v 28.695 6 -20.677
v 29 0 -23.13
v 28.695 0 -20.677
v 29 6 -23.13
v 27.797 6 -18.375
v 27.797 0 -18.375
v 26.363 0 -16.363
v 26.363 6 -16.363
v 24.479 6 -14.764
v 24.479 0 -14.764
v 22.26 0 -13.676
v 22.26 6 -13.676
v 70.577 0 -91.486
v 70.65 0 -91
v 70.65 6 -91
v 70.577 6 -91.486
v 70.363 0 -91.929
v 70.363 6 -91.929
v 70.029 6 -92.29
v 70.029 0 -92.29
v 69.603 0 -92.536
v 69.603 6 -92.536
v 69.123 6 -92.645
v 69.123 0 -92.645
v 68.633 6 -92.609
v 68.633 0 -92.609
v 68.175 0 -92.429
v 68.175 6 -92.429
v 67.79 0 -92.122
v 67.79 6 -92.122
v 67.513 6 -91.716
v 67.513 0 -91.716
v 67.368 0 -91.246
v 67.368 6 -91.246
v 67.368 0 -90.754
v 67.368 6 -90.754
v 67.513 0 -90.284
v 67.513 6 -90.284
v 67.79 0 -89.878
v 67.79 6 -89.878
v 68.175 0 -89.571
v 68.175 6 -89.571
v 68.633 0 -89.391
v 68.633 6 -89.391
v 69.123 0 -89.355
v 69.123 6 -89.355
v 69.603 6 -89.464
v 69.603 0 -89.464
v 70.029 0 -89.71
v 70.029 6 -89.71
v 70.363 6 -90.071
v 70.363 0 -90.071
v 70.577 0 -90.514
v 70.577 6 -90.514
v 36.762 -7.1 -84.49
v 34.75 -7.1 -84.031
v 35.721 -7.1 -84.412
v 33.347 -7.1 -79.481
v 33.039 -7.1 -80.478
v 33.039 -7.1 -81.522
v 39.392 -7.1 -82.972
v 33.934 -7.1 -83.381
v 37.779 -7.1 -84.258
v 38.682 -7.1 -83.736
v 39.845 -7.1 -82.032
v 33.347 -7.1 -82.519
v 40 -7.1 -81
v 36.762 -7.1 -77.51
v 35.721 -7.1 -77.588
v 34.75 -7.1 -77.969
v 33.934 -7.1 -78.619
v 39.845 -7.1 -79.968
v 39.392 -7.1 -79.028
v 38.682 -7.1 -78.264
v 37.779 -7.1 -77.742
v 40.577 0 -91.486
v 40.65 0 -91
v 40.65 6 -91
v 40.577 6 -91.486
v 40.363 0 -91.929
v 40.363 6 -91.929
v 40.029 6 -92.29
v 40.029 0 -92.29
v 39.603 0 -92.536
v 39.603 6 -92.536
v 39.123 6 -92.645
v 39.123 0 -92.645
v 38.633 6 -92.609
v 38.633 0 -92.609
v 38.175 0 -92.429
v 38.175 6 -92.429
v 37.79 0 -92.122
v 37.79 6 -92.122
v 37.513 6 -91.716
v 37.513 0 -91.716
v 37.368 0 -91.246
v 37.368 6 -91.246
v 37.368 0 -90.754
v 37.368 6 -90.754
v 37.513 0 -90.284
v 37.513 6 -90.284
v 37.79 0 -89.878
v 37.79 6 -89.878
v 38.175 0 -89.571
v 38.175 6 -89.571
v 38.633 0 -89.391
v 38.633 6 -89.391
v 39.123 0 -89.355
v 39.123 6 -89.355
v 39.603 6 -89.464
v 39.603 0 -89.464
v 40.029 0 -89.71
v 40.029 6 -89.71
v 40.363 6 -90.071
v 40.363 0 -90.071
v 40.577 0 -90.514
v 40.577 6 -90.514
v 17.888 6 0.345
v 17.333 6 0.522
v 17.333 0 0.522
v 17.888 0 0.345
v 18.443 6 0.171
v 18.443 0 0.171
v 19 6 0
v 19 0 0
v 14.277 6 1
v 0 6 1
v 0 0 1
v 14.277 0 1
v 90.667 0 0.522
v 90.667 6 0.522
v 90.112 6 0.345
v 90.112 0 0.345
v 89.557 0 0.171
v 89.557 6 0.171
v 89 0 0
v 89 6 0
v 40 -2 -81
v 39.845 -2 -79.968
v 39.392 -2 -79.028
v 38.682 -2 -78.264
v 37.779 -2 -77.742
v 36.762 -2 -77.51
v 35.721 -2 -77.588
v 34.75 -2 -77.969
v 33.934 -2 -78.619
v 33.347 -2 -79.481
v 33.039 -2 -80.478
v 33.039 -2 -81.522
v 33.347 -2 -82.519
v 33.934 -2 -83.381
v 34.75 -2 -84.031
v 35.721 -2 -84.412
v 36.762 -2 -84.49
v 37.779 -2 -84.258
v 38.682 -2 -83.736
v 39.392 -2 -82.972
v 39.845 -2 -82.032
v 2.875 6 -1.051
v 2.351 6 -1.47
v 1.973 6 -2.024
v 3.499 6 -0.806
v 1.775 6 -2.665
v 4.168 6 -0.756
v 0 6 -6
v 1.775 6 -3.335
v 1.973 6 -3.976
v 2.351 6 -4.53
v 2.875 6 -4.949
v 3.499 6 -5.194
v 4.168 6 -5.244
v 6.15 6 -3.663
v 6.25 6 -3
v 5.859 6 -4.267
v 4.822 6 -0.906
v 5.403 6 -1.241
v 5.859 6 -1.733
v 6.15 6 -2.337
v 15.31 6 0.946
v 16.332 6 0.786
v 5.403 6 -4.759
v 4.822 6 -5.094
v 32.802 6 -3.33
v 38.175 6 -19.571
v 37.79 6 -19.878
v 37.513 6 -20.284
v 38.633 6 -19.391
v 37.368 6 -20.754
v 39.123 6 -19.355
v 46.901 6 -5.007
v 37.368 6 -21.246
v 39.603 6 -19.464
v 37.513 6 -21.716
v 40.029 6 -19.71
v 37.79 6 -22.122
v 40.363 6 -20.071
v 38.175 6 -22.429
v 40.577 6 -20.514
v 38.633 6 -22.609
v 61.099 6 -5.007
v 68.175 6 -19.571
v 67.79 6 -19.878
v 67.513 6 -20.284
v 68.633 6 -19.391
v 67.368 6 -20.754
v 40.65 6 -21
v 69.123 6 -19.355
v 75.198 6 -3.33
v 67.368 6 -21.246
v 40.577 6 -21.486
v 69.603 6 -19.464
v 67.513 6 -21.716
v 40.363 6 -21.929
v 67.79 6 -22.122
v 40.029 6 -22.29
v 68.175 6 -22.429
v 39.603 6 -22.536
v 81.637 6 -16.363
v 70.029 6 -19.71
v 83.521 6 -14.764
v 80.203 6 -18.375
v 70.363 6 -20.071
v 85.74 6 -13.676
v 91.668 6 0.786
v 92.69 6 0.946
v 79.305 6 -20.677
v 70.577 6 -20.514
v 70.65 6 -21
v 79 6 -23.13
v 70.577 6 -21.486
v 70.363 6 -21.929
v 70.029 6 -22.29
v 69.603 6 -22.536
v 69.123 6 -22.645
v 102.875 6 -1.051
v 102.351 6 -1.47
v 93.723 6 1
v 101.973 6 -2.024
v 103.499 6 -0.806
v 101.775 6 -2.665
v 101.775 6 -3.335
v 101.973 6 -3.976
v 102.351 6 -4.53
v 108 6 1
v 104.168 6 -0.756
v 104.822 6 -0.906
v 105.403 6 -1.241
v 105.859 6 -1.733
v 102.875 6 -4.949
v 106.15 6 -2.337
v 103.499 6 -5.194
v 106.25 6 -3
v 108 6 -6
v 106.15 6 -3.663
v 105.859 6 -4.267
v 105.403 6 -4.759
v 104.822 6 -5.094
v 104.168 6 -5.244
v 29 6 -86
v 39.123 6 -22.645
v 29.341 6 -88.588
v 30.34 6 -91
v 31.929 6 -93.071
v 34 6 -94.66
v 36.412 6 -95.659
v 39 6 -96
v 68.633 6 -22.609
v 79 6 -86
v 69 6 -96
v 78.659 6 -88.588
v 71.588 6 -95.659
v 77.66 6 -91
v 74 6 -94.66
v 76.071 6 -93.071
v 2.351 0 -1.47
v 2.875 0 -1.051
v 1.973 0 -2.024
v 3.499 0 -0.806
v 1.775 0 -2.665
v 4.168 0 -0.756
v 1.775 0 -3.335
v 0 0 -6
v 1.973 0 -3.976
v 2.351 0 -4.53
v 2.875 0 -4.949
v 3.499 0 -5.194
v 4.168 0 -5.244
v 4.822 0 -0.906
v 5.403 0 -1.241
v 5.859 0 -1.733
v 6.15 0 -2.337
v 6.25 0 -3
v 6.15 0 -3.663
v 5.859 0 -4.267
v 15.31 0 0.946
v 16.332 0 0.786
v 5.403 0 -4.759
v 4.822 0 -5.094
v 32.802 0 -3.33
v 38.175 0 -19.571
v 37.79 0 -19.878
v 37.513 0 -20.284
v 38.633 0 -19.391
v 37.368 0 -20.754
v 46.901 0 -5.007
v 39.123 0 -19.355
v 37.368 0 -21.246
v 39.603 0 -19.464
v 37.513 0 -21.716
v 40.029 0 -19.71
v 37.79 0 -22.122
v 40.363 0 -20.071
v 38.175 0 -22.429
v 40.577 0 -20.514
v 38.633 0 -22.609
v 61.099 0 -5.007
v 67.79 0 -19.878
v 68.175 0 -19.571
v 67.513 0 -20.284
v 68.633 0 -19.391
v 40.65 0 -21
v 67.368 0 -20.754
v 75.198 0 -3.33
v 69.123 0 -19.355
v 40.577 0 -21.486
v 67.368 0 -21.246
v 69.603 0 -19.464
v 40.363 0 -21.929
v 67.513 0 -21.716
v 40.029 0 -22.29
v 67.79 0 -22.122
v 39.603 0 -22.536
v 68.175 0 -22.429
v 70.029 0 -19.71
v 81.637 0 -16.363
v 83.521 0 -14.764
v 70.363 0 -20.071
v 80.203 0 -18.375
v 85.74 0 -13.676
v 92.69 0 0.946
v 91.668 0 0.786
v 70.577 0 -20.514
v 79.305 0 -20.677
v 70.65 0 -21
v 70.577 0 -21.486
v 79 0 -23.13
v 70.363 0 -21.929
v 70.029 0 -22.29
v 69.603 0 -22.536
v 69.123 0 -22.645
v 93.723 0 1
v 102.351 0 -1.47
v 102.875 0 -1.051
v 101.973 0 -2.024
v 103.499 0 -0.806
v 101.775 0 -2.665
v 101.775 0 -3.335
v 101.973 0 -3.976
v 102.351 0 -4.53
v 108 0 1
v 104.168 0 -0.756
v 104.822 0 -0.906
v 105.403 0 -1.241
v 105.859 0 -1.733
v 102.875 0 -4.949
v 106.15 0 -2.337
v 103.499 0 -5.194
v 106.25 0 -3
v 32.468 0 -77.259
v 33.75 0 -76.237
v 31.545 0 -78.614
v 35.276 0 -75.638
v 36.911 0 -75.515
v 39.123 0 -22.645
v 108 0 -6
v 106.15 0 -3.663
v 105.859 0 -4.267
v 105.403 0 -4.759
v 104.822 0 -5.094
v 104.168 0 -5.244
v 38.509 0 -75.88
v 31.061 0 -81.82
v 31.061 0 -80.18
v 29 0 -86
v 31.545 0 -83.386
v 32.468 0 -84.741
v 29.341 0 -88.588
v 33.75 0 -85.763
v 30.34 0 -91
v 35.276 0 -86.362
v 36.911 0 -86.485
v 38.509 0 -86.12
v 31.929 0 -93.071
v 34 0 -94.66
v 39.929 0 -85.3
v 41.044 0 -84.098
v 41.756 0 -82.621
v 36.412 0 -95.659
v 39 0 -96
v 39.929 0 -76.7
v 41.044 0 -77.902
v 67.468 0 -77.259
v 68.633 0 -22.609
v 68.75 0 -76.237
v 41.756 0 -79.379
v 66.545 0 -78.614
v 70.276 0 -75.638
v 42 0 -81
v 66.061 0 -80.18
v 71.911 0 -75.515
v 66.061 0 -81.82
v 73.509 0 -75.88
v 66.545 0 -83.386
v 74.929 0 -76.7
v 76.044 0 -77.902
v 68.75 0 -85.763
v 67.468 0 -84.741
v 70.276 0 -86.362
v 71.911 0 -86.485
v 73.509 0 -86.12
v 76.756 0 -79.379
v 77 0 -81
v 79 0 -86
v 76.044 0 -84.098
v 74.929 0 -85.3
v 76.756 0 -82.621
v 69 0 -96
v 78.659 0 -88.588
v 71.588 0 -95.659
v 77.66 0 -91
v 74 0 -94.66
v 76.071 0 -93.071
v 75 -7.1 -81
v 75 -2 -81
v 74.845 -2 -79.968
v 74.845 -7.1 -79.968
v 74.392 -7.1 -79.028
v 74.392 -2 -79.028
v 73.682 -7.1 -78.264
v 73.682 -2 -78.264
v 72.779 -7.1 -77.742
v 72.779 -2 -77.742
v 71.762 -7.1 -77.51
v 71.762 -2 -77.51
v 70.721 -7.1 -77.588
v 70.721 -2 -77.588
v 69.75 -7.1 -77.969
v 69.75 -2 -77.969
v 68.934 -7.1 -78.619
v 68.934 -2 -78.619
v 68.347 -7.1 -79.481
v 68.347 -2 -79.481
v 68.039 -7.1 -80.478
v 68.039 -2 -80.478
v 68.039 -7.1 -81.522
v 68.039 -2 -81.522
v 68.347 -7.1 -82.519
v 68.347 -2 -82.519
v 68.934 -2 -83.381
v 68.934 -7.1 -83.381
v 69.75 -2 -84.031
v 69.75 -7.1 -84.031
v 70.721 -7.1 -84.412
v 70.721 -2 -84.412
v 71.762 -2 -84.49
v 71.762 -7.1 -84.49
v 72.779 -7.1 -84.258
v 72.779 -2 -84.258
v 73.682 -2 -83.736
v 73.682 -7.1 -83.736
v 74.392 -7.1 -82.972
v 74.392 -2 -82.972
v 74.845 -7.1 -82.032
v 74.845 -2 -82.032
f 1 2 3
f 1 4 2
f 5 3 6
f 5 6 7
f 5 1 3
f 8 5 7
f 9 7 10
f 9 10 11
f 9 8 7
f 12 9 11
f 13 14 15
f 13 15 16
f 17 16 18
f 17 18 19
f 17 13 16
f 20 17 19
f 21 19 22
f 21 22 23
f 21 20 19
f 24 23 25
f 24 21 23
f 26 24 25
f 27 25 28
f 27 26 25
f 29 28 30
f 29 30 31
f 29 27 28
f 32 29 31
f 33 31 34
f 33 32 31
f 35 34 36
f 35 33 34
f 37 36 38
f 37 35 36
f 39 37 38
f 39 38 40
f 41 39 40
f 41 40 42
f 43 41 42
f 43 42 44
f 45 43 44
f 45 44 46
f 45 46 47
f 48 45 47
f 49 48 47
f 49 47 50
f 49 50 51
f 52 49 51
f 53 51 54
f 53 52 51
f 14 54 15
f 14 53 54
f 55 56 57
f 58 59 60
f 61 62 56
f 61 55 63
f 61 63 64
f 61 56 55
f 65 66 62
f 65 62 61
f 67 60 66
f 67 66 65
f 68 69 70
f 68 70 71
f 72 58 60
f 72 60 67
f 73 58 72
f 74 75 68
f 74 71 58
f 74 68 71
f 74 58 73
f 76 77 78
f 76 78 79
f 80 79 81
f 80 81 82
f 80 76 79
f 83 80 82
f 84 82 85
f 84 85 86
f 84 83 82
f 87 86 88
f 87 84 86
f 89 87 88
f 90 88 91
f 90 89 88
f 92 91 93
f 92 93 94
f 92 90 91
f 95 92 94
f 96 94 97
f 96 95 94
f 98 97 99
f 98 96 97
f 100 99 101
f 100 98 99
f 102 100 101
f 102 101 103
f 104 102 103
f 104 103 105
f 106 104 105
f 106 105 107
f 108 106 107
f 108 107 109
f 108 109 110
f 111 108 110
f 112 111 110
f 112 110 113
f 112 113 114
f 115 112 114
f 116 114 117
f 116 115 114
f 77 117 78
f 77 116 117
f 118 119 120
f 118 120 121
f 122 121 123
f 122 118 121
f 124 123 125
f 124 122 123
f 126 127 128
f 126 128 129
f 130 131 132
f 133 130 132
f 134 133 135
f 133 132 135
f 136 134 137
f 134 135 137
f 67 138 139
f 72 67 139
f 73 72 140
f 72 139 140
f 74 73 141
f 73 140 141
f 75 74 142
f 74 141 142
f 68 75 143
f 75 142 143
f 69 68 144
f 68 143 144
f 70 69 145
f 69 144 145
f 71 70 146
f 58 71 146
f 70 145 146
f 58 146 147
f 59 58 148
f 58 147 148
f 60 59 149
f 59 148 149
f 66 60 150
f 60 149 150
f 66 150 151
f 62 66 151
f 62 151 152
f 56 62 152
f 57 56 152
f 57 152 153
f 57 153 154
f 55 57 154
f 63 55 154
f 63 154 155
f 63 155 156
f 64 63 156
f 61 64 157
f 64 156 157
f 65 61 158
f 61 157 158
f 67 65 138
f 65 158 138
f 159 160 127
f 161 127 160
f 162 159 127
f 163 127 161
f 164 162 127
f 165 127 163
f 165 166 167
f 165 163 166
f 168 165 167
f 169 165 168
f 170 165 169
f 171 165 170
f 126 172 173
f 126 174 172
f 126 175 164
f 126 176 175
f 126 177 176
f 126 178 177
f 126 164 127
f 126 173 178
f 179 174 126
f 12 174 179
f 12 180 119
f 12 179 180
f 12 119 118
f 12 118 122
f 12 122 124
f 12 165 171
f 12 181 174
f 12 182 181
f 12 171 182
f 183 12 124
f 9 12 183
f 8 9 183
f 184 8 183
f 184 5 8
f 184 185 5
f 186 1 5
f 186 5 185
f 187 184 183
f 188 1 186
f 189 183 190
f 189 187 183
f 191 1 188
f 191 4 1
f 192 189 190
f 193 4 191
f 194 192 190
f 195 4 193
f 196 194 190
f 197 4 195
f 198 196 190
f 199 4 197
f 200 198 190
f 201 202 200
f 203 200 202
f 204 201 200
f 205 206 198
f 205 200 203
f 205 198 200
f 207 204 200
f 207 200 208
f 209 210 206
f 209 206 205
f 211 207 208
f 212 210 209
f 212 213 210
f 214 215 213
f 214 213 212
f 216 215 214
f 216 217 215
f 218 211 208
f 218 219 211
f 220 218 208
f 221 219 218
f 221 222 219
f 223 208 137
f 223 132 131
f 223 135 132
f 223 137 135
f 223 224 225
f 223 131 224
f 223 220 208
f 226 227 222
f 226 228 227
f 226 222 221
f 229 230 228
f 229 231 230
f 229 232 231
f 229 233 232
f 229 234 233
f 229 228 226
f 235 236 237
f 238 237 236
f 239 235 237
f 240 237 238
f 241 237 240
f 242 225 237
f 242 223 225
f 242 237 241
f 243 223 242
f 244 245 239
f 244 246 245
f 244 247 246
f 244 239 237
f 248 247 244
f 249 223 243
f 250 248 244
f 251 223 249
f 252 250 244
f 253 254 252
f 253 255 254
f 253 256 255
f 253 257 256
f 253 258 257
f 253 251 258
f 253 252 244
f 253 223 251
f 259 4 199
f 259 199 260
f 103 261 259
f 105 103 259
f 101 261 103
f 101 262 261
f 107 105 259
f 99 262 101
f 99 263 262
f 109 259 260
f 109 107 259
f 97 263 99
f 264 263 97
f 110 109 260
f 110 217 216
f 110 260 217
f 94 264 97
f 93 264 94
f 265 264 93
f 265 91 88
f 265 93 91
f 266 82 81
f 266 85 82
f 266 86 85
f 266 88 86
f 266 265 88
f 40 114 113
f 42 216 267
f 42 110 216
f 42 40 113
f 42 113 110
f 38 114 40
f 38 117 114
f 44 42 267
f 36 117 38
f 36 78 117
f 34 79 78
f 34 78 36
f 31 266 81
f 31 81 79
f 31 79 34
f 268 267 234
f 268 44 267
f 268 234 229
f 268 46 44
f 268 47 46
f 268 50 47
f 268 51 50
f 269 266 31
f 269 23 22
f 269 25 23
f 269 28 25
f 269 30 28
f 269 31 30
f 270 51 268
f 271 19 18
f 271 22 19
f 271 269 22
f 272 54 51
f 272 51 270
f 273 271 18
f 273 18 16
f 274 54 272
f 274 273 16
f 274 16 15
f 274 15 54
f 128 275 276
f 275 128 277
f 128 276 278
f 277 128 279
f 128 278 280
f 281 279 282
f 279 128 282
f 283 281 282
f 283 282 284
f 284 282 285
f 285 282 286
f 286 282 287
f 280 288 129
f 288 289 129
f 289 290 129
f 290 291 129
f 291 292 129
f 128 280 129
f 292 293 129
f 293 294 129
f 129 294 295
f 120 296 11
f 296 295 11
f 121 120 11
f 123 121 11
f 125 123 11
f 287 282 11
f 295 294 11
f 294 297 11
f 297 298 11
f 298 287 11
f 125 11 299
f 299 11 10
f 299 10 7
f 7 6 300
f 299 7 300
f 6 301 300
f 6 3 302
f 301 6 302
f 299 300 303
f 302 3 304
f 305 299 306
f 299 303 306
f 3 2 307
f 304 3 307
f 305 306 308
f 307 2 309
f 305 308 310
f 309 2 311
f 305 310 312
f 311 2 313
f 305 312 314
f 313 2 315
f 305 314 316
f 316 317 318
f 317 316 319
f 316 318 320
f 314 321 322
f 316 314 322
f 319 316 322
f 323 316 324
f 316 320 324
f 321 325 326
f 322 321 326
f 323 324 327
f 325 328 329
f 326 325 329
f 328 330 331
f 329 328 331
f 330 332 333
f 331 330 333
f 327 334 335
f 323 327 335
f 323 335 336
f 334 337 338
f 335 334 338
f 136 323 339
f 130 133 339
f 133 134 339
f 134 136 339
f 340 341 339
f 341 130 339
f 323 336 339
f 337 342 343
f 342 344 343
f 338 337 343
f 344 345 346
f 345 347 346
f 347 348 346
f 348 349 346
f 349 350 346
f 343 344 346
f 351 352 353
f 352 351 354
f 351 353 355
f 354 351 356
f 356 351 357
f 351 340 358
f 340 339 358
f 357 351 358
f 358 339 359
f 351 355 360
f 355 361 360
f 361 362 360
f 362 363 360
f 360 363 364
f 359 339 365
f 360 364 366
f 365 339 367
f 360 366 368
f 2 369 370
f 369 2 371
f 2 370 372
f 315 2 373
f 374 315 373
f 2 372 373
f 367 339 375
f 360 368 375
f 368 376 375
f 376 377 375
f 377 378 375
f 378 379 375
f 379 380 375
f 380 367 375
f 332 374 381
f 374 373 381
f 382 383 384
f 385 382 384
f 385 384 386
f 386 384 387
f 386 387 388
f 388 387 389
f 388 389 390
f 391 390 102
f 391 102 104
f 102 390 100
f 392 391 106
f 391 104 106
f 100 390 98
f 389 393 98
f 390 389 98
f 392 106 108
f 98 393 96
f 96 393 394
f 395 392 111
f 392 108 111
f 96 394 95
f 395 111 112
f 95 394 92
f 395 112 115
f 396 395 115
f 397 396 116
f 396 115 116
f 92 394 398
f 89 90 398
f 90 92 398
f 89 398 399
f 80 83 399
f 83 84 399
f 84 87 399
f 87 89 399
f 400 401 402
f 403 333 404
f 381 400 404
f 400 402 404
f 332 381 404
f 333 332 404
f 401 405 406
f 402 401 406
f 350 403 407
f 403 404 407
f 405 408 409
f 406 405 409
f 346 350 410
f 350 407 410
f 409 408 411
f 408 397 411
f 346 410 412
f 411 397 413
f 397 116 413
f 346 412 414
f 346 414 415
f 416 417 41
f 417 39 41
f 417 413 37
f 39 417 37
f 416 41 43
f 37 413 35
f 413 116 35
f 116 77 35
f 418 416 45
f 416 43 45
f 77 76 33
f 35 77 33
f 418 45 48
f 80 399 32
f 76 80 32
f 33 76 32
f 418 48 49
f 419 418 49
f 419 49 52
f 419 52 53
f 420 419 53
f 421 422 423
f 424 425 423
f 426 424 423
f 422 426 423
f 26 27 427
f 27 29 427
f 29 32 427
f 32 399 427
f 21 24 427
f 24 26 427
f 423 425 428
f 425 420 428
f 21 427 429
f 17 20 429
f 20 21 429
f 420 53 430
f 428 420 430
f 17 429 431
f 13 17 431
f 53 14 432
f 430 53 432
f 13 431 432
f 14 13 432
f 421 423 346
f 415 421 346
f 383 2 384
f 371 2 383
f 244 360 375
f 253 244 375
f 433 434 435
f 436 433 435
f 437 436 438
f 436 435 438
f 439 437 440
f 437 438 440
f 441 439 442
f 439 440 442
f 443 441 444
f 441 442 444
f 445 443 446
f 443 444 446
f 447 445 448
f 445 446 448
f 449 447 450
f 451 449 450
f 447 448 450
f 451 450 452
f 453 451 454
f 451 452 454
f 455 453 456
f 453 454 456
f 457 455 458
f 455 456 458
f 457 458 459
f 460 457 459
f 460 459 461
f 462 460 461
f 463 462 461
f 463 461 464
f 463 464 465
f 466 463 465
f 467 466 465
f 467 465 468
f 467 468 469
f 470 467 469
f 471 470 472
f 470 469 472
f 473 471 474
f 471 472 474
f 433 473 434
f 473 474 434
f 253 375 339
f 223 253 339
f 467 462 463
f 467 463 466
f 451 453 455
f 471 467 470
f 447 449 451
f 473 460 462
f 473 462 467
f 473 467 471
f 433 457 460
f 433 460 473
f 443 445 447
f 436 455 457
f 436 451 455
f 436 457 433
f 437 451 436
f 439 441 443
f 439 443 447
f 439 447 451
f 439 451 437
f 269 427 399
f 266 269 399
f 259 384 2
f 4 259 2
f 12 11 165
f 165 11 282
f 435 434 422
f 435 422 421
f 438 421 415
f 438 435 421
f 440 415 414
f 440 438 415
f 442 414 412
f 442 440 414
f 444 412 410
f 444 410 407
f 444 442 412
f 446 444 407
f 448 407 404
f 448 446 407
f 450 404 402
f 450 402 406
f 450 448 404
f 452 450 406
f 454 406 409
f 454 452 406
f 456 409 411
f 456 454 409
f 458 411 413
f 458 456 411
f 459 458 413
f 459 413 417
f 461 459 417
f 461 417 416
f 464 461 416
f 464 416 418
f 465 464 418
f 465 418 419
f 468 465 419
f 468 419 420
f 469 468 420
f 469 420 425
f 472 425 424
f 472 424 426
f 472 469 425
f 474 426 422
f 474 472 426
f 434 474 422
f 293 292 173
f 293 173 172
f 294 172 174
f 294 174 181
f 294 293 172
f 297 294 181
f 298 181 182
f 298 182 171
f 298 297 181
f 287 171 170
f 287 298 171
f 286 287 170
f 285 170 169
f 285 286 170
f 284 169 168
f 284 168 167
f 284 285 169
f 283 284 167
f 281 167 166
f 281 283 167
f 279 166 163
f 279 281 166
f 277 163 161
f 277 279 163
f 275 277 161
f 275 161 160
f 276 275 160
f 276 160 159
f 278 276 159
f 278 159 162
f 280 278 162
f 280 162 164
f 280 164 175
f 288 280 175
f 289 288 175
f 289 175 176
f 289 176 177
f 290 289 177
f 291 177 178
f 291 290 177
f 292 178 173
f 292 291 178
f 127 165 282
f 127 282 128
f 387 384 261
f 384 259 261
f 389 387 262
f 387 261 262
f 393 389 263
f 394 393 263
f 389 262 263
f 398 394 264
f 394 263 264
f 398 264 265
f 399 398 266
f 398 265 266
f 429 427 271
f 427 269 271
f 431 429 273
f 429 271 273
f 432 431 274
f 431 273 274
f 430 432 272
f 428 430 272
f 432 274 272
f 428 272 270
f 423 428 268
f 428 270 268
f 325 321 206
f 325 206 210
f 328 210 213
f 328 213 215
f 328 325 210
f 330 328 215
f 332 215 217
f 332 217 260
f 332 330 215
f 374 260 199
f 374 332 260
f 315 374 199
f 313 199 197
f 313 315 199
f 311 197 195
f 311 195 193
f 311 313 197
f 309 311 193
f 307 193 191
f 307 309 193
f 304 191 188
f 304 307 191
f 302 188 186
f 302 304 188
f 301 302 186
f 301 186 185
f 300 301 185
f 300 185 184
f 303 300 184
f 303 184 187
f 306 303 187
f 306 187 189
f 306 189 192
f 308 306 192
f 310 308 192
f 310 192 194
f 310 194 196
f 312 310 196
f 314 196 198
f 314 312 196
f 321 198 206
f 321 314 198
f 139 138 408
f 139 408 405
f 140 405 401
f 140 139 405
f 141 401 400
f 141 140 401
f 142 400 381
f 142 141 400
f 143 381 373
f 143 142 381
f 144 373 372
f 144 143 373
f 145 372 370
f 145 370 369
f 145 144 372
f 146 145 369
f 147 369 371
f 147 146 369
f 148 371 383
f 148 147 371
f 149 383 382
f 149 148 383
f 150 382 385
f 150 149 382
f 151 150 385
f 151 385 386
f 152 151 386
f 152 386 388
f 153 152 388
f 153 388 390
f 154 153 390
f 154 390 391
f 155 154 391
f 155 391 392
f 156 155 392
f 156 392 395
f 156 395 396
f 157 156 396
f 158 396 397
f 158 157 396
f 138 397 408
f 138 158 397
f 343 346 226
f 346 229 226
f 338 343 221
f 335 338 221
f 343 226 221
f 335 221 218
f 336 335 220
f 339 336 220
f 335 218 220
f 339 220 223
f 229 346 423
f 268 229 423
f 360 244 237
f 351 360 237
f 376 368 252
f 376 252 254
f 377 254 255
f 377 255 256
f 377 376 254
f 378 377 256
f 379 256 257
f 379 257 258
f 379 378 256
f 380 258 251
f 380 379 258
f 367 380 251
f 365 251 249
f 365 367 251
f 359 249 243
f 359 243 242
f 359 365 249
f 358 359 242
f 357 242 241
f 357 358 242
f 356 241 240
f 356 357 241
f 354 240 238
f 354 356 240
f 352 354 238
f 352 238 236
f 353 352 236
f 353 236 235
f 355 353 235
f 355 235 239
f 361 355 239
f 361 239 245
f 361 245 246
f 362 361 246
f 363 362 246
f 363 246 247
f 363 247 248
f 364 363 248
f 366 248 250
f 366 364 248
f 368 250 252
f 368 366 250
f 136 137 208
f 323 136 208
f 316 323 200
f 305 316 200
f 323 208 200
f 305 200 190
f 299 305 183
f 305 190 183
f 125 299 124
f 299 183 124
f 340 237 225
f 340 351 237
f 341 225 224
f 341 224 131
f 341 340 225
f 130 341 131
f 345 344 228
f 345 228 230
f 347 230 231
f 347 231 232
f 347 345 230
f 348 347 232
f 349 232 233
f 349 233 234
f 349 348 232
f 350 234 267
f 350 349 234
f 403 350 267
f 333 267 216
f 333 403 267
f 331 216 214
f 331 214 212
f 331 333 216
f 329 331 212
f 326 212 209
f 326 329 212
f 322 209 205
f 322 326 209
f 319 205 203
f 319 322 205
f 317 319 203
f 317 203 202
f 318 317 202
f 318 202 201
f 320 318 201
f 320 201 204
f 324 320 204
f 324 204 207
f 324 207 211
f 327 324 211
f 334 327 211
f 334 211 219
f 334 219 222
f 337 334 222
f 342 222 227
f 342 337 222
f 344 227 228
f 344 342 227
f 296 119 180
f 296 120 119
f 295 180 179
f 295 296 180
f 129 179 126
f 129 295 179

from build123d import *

# Parameters (mm, degrees)
SKETCH1_R               = 2.25
SKETCH1_R_2             = 1.65
BOSS_EXTRUDE1_DEPTH     = 6
CUT_EXTRUDE1_DEPTH      = 1
CUT_EXTRUDE1_DEPTH_BACK = 7
SKETCH3_R               = 3.5
BOSS_EXTRUDE2_DEPTH     = 7.1
CHAMFER1_SIZE           = 2
BOSS_EXTRUDE3_DEPTH     = 6
FILLET1_R               = 10


with BuildPart() as part:
    # Sketch1 → Boss-Extrude1 (new body)
    with BuildSketch(Plane(origin=(0, 0, 0), x_dir=(1, 0, 0), z_dir=(0, 1, 0))):
        Polygon((0, 0), (108, 0), (108, 6), (79, 16), (79, 96), (29, 96), (29, 16), (0, 6), align=None)
        with Locations((4, 3)):
            Circle(SKETCH1_R, mode=Mode.SUBTRACT)
        with Locations((104, 3)):
            Circle(SKETCH1_R, mode=Mode.SUBTRACT)
        with Locations((39, 91)):
            Circle(SKETCH1_R_2, mode=Mode.SUBTRACT)
        with Locations((69, 91)):
            Circle(SKETCH1_R_2, mode=Mode.SUBTRACT)
        with Locations((39, 21)):
            Circle(SKETCH1_R_2, mode=Mode.SUBTRACT)
        with Locations((69, 21)):
            Circle(SKETCH1_R_2, mode=Mode.SUBTRACT)
    extrude(amount=BOSS_EXTRUDE1_DEPTH)

    # Sketch2 → Cut-Extrude1 (cut, two sides)
    with BuildSketch(Plane(origin=(0, 6, 0), x_dir=(1, 0, 0), z_dir=(0, 1, 0))) as cut_extrude1_sk:
        with BuildLine():
            Line((19, 0), (89, 0))
            ThreePointArc((89, 0), (54, 5.217597168), (19, 0))
        make_face()
    extrude(amount=CUT_EXTRUDE1_DEPTH, mode=Mode.SUBTRACT)
    extrude(cut_extrude1_sk.sketch, amount=-CUT_EXTRUDE1_DEPTH_BACK, mode=Mode.SUBTRACT)

    # Sketch3 → Boss-Extrude2 (add)
    with BuildSketch(Plane.XZ):
        with Locations((36.5, -81)):
            Circle(SKETCH3_R)
        with Locations((71.5, -81)):
            Circle(SKETCH3_R)
    extrude(amount=BOSS_EXTRUDE2_DEPTH)

    # Chamfer1
    chamfer1_edges = [part.edges().sort_by_distance(p)[0] for p in [
        (33, 0, -81),
        (68, 0, -81),
    ]]
    chamfer(chamfer1_edges, length=CHAMFER1_SIZE)

    # Sketch4 → Boss-Extrude3 (add)
    with BuildSketch(Plane(origin=(0, 6, 0), x_dir=(1, 0, 0), z_dir=(0, 1, 0))):
        with BuildLine():
            Line((0, 0), (0, -1))
            Line((0, -1), (15.874355013, -1))
            ThreePointArc((15.874355013, -1), (17.433758893, -0.489314628), (19, 0))
            Line((19, 0), (0, 0))
        make_face()
        with BuildLine():
            Line((108, -1), (92.125644987, -1))
            ThreePointArc((92.125644987, -1), (90.566241107, -0.489314628), (89, 0))
            Line((89, 0), (108, 0))
            Line((108, 0), (108, -1))
        make_face()
    extrude(amount=-BOSS_EXTRUDE3_DEPTH)

    # Fillet1
    fillet1_edges = [part.edges().sort_by_distance(p)[0] for p in [
        (29, 3, -16),
        (29, 3, -96),
        (79, 3, -96),
        (79, 3, -16),
        (15.874355013, 3, 1),
        (92.125644987, 3, 1),
    ]]
    fillet(fillet1_edges, radius=FILLET1_R)


solid = part.part
